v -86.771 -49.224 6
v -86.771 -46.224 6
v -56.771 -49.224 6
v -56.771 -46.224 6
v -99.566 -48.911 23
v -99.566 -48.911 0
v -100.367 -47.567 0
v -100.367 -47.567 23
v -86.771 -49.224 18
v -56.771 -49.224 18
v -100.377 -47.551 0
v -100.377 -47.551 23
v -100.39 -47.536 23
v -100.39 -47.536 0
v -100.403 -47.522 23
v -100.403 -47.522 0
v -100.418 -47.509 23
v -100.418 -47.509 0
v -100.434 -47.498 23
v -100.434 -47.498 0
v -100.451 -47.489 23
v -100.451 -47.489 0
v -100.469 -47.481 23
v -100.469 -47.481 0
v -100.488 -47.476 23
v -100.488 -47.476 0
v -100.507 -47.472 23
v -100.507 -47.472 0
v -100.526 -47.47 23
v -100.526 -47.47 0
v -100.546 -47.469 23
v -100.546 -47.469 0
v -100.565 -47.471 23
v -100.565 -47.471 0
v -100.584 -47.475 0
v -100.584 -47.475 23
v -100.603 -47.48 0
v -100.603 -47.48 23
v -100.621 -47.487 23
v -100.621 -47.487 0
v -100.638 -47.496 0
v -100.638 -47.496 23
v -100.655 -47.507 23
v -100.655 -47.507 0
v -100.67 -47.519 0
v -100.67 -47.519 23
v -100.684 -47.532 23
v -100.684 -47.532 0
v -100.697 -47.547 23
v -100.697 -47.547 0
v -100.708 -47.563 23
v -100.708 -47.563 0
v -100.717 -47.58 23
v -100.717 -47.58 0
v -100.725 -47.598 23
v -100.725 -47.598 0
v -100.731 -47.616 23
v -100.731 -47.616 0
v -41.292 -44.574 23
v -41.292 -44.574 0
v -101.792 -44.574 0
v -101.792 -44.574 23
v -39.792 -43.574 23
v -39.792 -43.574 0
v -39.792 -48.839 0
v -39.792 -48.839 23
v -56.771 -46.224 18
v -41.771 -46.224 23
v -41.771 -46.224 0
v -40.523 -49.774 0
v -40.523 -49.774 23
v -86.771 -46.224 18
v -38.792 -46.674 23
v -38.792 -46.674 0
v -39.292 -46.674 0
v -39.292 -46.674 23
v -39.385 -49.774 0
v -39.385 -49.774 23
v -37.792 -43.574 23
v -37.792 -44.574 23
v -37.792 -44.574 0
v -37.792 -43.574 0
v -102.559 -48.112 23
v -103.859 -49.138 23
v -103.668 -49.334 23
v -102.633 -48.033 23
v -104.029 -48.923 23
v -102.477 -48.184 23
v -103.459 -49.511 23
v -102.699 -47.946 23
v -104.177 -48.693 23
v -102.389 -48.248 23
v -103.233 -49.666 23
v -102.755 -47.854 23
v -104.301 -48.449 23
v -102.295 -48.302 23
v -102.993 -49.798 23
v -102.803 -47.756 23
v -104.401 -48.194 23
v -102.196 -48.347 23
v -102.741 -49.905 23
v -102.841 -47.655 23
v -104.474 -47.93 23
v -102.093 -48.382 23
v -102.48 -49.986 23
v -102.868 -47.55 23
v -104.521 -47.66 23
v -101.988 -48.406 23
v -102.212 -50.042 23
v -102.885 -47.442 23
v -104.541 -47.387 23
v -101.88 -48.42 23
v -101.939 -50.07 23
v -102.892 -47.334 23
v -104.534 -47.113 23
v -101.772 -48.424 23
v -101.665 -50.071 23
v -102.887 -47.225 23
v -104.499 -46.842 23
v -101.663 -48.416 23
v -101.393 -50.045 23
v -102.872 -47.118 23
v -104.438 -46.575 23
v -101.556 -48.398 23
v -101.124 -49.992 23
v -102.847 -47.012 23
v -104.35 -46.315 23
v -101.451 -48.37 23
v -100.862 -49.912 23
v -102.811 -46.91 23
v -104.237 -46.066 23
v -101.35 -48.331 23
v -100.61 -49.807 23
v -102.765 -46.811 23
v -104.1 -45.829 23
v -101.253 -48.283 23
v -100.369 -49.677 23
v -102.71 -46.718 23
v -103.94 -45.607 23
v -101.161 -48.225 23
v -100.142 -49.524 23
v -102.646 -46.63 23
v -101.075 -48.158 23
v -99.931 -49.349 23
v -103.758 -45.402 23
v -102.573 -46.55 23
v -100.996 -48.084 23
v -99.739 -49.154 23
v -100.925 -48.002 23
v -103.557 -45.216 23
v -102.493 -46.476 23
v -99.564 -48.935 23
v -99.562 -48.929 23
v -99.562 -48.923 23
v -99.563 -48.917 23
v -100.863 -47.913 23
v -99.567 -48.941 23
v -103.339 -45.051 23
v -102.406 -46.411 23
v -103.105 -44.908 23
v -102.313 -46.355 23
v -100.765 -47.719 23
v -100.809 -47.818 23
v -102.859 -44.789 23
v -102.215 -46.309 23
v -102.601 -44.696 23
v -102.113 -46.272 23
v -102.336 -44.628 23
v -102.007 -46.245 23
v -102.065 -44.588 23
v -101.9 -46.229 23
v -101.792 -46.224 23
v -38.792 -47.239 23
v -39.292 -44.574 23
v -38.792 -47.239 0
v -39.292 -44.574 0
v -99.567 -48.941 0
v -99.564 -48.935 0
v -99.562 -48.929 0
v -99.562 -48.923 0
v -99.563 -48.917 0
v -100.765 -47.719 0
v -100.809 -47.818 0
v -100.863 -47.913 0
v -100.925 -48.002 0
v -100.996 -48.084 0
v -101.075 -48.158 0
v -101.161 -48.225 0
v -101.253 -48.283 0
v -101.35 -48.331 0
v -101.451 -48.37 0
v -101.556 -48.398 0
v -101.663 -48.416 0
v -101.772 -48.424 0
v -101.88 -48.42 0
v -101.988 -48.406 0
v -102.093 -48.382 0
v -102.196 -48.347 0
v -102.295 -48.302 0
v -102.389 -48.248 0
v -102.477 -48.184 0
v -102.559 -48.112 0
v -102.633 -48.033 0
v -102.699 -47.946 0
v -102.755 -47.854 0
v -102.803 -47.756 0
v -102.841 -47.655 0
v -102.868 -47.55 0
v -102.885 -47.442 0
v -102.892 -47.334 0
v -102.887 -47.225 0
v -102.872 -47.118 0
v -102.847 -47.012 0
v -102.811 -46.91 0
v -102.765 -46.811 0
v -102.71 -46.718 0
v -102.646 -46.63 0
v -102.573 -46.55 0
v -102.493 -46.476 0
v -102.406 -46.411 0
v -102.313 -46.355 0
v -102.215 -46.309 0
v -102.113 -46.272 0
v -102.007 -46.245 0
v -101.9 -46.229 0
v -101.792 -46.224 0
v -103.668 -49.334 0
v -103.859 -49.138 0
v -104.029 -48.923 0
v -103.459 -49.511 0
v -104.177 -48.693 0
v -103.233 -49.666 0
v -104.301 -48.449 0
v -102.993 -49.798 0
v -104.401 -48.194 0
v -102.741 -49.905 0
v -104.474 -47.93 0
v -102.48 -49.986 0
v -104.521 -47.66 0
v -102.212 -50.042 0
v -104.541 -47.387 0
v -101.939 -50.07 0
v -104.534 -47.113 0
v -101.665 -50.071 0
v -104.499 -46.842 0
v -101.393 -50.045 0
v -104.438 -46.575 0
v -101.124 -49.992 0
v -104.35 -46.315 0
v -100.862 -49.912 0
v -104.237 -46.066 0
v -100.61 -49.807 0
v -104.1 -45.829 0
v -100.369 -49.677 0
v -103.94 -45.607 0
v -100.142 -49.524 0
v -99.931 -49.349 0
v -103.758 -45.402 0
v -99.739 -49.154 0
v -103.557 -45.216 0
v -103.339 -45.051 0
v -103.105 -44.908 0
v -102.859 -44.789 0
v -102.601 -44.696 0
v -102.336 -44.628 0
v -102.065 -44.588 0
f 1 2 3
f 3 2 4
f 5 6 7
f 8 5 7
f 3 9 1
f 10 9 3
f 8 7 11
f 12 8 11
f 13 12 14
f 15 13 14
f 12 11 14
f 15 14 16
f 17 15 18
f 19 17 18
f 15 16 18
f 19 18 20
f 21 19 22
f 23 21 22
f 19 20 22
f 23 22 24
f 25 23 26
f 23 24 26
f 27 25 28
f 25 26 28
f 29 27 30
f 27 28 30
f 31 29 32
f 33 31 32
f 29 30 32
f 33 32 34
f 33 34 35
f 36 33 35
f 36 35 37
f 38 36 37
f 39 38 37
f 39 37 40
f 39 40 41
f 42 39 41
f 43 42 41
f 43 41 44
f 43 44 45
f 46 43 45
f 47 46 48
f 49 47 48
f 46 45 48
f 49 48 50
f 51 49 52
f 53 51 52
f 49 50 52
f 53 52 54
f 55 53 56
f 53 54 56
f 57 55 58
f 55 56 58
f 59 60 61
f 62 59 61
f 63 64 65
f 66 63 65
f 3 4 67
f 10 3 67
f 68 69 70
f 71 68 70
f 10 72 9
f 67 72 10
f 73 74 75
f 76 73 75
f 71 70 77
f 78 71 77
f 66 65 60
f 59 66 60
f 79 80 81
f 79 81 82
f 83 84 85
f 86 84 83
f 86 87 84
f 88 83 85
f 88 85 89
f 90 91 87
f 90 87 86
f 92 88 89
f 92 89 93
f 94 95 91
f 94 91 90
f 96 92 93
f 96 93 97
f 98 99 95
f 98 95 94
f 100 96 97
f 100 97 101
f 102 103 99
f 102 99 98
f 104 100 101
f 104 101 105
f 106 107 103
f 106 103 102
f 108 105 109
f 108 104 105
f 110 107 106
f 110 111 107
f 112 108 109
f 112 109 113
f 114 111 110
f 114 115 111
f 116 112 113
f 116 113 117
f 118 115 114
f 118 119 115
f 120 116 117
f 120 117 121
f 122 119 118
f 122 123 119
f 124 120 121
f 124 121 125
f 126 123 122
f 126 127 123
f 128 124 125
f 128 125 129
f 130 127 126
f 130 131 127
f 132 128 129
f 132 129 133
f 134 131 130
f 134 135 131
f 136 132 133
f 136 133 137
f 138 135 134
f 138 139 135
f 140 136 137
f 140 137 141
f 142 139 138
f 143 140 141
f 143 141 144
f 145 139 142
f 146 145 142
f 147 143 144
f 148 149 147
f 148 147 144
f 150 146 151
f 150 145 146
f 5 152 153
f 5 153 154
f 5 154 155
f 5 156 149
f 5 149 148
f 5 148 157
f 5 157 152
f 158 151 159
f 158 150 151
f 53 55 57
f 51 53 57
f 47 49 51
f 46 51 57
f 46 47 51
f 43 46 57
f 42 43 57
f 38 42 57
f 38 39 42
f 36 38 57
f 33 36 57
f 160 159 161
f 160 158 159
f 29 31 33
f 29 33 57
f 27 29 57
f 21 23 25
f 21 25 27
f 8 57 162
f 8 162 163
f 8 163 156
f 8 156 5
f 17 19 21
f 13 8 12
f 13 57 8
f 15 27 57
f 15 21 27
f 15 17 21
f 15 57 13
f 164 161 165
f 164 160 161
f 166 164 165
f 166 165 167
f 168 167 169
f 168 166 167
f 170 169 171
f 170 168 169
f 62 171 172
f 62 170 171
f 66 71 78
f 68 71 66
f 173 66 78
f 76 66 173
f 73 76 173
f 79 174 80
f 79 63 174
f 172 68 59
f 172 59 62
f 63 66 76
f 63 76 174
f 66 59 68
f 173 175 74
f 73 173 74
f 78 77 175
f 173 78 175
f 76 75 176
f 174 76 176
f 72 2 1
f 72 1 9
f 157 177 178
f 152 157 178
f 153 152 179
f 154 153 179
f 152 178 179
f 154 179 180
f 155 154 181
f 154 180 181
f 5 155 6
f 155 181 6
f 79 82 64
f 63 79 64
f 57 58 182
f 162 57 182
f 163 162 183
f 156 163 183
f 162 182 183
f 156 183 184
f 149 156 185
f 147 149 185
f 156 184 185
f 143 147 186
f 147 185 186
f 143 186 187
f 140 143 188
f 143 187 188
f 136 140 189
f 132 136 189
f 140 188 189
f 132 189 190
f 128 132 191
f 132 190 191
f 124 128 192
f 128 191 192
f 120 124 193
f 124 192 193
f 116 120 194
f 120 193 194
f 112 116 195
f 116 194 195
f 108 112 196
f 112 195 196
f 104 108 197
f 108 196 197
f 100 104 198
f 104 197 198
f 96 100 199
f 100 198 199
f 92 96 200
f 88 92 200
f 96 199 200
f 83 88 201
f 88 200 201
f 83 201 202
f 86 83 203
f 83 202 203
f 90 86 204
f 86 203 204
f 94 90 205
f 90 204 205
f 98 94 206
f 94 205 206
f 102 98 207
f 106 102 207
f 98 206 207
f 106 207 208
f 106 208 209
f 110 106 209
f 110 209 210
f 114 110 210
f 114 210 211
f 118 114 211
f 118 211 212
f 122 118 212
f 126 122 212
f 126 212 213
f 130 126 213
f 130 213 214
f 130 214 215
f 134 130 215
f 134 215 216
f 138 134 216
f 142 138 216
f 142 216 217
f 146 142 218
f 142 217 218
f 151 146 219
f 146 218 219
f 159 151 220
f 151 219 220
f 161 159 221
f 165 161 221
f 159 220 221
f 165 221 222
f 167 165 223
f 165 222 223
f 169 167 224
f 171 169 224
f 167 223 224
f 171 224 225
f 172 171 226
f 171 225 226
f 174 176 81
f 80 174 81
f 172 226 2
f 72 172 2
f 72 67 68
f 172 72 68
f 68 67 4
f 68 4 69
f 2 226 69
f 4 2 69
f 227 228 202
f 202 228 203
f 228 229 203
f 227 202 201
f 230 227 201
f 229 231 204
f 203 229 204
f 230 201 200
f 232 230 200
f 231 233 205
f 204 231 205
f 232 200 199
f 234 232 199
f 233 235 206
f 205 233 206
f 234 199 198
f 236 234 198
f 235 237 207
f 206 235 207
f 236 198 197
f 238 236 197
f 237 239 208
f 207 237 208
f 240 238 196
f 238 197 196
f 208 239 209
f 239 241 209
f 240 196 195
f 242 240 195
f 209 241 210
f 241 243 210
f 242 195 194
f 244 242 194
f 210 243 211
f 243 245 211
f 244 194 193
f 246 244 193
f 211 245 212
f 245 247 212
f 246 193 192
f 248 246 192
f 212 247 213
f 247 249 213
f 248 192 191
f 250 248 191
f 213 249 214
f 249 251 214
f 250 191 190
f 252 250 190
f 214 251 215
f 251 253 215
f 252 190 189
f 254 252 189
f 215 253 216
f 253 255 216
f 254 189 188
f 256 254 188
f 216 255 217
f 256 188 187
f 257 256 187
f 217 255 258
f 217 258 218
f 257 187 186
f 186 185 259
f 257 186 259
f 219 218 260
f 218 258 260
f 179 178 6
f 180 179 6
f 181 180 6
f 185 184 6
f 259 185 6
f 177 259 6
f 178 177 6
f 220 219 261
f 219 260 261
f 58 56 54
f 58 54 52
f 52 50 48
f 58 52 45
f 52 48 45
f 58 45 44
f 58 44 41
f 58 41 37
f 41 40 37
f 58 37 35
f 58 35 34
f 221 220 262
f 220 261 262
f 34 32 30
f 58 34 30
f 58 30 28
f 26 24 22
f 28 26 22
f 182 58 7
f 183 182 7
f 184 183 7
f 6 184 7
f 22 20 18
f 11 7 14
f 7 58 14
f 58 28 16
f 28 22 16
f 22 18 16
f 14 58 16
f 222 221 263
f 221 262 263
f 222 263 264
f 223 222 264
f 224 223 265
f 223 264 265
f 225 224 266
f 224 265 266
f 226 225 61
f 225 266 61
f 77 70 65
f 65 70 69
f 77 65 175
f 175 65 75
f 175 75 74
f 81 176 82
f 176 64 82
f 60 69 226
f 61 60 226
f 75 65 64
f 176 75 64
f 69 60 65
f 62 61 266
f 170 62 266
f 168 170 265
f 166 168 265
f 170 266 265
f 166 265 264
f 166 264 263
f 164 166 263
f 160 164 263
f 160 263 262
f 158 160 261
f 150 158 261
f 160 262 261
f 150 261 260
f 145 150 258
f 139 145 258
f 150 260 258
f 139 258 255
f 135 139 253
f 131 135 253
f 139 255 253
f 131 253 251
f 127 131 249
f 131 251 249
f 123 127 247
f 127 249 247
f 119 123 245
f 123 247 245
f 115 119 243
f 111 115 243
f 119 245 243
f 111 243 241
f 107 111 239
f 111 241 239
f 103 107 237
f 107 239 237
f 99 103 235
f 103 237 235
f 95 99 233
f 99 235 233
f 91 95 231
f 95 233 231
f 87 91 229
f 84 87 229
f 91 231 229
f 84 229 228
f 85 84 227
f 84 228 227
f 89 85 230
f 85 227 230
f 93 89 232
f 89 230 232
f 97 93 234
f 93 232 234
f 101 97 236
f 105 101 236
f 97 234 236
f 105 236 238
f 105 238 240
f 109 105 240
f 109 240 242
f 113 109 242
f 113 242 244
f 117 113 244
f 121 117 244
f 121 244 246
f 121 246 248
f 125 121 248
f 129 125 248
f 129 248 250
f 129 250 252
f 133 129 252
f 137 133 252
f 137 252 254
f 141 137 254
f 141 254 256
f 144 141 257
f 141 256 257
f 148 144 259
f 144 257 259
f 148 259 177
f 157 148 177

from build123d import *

# Parameters (mm, degrees)
F1_DEPTH = 23
F3_DEPTH = 25
F4_W     = 30
F4_H     = 12
F5_DEPTH = 3


with BuildPart() as f1:
    # F0 (on Top) → F1 (new body)
    with BuildSketch(Plane.XY):
        with BuildLine():
            Line((-101.79164, -46.223918), (-41.771353, -46.223918))
            Line((-41.771353, -46.223918), (-40.522749, -49.773918))
            Line((-40.522749, -49.773918), (-38.79164, -49.773918))
            Line((-38.79164, -49.773918), (-38.79164, -46.673918))
            Line((-38.79164, -46.673918), (-39.29164, -46.673918))
            Line((-39.29164, -46.673918), (-39.29164, -44.573918))
            Line((-39.29164, -44.573918), (-38.79164, -44.573918))
            Line((-38.79164, -44.573918), (-37.79164, -44.573918))
            Line((-37.79164, -44.573918), (-37.79164, -43.573918))
            Line((-37.79164, -43.573918), (-39.79164, -43.573918))
            Line((-39.79164, -43.573918), (-39.79164, -48.838682))
            Line((-39.79164, -48.838682), (-41.29164, -44.573918))
            Line((-41.29164, -44.573918), (-101.79164, -44.573918))
            ThreePointArc((-101.79164, -44.573918), (-104.241978, -48.572254), (-99.567025, -48.940578))
            ThreePointArc((-99.567025, -48.940578), (-99.561923, -48.926017), (-99.565678, -48.911052))
            Line((-99.565678, -48.911052), (-100.36651, -47.566828))
            ThreePointArc((-100.36651, -47.566828), (-100.565096, -47.47099), (-100.731146, -47.616072))
            ThreePointArc((-100.731146, -47.616072), (-102.666674, -47.990488), (-101.79164, -46.223918))
        make_face()
    extrude(amount=F1_DEPTH)

    # F2 (on face) → F3 (cut)
    with BuildSketch(Plane(origin=(0, 0, 0), x_dir=(1, 0, 0), z_dir=(0, 0, -1))):
        Polygon((-39.385125, 49.773918), (-38.79164, 47.239013), (-38.79164, 49.773918), align=None)
    extrude(amount=-F3_DEPTH, mode=Mode.SUBTRACT)

    # F4 (on face) → F5 (join)
    with BuildSketch(Plane.XZ.offset(46.223918)):
        with Locations((-71.771353, 12)):
            Rectangle(F4_W, F4_H)
    extrude(amount=F5_DEPTH)


solid = f1.part
